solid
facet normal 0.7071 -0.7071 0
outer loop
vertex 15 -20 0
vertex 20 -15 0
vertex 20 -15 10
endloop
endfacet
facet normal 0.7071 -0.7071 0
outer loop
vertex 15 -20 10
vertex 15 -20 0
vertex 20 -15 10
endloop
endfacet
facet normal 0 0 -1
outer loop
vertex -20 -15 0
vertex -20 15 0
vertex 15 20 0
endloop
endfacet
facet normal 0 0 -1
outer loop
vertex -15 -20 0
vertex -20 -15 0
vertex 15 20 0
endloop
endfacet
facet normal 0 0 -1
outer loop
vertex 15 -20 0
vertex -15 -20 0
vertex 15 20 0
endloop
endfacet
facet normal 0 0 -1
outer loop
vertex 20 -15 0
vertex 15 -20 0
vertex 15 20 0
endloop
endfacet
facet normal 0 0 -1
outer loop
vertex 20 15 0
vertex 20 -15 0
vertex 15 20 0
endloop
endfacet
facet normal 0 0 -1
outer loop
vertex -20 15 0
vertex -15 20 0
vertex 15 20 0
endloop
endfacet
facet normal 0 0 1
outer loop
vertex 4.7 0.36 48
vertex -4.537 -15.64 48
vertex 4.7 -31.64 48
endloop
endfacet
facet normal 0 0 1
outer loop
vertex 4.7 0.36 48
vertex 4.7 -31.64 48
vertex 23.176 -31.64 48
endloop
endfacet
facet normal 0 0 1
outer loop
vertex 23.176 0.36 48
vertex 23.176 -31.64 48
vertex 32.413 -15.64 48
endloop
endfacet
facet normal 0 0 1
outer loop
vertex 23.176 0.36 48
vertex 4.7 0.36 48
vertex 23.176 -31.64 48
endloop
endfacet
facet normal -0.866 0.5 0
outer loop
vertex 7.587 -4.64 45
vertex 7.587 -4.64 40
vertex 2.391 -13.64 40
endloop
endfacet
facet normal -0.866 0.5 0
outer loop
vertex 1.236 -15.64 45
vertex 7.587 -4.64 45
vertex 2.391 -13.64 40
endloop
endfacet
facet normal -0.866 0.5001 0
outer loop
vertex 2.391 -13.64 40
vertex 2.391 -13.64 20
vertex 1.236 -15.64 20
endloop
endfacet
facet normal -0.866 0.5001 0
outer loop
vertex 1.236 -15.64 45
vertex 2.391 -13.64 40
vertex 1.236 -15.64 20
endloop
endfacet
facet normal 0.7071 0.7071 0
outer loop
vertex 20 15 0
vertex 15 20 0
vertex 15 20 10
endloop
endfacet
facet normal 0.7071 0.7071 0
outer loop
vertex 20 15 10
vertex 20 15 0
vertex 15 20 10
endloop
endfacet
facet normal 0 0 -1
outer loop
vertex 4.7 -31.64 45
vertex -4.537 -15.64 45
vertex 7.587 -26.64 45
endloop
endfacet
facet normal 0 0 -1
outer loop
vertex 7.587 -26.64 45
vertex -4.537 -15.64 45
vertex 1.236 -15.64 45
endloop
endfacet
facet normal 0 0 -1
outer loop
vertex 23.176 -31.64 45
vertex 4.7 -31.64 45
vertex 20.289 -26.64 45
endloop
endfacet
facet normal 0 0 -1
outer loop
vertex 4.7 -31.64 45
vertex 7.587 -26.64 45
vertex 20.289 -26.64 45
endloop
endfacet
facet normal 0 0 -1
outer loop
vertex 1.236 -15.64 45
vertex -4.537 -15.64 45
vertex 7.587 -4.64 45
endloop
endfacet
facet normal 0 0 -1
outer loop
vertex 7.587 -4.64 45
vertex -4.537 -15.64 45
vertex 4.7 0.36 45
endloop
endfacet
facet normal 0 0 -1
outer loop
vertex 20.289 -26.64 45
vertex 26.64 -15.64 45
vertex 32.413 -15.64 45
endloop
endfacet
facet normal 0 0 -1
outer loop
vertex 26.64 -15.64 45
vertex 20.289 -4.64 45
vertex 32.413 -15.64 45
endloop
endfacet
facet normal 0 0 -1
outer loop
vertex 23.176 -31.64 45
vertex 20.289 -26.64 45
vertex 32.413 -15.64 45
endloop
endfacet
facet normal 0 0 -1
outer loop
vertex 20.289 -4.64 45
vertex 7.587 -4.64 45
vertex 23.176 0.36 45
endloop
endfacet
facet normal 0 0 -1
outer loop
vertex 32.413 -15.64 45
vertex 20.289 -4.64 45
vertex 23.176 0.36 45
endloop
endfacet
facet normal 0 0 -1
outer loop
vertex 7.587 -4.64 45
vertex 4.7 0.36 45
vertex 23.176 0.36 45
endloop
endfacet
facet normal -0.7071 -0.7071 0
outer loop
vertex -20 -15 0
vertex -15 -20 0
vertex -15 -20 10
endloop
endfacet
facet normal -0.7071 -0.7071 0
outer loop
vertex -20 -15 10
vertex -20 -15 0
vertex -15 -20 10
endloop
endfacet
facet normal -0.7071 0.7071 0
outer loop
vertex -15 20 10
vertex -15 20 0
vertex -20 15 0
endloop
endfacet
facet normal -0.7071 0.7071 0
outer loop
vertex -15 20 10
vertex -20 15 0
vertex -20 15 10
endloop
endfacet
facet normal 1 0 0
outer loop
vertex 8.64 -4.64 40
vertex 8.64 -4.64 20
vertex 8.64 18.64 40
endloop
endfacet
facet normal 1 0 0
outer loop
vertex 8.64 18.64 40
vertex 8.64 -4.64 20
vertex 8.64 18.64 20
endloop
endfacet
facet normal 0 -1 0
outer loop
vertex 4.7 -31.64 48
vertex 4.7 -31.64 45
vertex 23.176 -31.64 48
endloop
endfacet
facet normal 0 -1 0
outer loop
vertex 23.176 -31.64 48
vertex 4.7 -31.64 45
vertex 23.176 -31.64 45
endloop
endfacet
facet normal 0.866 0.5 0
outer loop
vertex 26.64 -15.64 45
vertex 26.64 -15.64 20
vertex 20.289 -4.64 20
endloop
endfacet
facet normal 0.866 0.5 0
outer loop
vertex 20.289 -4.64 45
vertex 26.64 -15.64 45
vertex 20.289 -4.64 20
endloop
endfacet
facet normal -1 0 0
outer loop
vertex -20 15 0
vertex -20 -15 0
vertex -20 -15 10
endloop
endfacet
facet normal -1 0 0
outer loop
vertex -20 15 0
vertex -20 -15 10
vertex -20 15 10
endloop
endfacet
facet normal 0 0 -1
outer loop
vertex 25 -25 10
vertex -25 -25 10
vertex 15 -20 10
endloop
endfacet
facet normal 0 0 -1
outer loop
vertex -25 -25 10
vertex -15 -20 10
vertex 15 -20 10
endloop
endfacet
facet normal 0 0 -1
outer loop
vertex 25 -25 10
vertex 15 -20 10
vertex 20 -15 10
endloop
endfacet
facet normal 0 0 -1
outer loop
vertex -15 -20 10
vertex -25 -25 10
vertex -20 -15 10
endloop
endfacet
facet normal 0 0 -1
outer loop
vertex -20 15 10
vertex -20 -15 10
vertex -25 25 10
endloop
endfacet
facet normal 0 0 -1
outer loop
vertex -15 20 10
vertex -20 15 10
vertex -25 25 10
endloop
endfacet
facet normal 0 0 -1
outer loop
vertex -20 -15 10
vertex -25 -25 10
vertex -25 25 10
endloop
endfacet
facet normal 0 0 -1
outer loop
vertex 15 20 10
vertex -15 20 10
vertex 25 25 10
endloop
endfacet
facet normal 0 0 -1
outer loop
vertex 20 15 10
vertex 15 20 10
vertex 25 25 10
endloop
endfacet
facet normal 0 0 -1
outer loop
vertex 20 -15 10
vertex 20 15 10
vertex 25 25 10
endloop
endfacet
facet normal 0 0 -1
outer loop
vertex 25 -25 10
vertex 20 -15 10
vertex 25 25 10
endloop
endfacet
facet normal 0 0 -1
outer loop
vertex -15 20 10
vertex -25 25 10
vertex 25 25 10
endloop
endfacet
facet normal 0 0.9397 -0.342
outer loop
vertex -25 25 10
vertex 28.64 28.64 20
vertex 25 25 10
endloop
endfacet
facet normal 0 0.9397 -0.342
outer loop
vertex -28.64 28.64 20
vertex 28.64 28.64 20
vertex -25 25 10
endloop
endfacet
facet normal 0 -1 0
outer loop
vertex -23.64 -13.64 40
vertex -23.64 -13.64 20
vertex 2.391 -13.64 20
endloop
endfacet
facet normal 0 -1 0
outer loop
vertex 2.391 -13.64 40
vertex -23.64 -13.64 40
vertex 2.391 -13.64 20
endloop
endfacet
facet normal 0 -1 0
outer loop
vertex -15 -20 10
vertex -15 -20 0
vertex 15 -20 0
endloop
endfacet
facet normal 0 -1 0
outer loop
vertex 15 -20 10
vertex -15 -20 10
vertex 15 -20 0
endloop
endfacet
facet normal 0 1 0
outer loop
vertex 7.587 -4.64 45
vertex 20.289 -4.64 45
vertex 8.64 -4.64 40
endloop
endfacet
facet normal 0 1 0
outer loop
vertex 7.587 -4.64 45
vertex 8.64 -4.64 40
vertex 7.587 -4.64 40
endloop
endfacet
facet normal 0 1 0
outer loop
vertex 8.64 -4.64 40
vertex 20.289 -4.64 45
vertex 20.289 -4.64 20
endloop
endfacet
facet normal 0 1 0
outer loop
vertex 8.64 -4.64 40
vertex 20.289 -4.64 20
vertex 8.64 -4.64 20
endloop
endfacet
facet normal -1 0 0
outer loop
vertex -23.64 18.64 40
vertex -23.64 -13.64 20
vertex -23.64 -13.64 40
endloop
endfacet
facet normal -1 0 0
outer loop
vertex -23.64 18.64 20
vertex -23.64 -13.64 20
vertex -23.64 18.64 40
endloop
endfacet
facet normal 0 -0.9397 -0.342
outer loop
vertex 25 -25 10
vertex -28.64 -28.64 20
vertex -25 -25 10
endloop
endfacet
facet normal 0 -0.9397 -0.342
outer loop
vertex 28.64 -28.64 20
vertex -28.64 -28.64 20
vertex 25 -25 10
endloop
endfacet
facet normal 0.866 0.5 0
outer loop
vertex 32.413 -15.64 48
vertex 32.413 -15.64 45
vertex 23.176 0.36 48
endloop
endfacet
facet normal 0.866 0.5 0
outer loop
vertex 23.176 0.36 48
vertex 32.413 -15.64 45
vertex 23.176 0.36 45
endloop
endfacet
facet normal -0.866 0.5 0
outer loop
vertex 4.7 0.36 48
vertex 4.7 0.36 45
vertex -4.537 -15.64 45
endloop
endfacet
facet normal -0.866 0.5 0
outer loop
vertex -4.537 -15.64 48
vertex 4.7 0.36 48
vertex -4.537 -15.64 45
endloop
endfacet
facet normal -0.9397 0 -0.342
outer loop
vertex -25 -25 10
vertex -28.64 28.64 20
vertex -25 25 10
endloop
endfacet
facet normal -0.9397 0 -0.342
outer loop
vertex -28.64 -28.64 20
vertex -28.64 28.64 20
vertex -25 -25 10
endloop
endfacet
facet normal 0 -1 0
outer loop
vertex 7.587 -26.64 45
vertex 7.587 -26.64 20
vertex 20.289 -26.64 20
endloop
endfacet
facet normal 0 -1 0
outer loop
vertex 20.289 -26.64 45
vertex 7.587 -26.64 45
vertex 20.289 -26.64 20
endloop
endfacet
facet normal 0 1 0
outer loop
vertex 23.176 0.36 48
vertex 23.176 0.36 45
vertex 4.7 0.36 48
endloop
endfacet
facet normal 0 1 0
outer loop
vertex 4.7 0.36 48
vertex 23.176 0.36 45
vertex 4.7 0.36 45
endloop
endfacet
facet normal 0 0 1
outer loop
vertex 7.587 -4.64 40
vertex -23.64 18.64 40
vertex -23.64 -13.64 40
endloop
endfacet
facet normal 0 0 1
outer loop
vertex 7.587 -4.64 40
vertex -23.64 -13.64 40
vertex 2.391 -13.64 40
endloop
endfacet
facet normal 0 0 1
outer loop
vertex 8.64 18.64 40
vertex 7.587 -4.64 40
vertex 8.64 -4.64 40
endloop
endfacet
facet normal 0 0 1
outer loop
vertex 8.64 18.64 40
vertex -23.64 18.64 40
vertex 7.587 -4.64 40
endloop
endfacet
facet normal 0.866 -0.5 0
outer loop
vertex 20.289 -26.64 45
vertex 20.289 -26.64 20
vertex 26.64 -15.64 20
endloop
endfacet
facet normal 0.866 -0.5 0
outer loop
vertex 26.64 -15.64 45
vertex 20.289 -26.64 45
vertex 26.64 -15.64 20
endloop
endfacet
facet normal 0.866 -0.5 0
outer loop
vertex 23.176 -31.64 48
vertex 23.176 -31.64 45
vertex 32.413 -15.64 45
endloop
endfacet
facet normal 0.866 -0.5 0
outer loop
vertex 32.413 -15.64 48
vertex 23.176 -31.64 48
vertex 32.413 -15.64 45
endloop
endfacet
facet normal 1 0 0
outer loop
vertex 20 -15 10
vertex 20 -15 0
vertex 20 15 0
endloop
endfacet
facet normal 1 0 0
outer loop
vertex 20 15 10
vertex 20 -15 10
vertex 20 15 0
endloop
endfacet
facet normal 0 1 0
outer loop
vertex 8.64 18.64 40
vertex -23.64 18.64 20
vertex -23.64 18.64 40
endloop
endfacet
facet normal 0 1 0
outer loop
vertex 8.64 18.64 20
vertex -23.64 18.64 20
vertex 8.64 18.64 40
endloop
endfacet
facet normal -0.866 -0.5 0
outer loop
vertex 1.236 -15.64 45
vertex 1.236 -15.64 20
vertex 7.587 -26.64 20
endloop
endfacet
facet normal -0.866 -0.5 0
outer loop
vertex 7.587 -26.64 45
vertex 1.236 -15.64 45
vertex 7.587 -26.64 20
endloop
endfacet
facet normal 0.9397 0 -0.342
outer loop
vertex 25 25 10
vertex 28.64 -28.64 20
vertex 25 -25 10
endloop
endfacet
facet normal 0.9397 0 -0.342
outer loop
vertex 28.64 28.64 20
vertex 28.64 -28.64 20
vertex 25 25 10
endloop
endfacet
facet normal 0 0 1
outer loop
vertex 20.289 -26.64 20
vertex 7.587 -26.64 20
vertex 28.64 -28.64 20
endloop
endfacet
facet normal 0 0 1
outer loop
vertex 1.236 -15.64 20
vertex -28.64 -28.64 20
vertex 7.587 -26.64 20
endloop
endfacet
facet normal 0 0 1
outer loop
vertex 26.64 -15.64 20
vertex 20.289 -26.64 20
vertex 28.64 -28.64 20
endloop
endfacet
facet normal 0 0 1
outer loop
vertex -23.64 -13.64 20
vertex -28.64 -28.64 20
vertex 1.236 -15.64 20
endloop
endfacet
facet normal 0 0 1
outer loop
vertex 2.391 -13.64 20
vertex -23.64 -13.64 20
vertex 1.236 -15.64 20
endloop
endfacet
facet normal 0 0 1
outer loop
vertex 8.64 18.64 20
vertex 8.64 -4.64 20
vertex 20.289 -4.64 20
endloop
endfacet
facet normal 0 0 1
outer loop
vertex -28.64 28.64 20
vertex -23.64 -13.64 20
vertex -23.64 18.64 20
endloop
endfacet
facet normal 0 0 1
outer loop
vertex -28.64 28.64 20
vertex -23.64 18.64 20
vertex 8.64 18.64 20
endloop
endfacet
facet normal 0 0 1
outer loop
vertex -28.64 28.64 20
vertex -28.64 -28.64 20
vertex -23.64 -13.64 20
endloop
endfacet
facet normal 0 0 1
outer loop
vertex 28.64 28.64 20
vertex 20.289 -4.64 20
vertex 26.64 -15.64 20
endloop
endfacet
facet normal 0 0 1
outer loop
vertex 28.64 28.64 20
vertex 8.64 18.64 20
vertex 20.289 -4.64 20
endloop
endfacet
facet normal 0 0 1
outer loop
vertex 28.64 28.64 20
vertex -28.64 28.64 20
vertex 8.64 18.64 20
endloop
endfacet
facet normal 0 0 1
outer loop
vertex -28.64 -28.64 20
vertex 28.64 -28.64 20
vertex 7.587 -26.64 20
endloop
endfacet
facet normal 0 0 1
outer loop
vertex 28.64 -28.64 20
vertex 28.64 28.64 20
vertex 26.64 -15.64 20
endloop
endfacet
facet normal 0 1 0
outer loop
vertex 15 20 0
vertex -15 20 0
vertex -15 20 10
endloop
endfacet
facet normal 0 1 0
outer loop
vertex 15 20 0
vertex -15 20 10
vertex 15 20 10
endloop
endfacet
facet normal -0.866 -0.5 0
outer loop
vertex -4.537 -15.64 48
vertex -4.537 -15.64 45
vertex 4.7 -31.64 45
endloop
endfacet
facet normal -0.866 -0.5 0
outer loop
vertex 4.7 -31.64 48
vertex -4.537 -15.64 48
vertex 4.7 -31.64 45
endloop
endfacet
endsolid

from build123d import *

# Parameters (mm, degrees)
F0_W      = 40
F0_H      = 40
F1_DEPTH  = 10
F2_SIZE   = 5
F3_W      = 50
F3_H      = 50
F4_DEPTH  = 10
F4_TAPER  = -20
F5_W      = 32.2794046853
F5_H      = 32.2794046853
F6_DEPTH  = 20
F8_DEPTH  = 25
F10_DEPTH = 3


with BuildPart() as f1:
    # F0 (on Top) → F1 (new body)
    with BuildSketch(Plane.XY):
        Rectangle(F0_W, F0_H)
    extrude(amount=F1_DEPTH)

    # F2
    f2_edges = [f1.edges().sort_by_distance(p)[0] for p in [
        (-20, -20, 5),
        (-20, 20, 5),
        (20, -20, 5),
        (20, 20, 5),
    ]]
    chamfer(f2_edges, length=F2_SIZE)

    # F3 (on face) → F4 (join)
    with BuildSketch(Plane.XY.offset(10)):
        Rectangle(F3_W, F3_H)
    extrude(amount=F4_DEPTH, taper=F4_TAPER)

    # F5 (on face) → F6 (join)
    with BuildSketch(Plane.XY.offset(20)):
        with Locations((-7.5, 2.5)):
            Rectangle(F5_W, F5_H)
    extrude(amount=F6_DEPTH)

    # F7 (on face) → F8 (join)
    with BuildSketch(Plane.XY.offset(20)):
        Polygon((20.2888493816, -26.6397023427), (26.6397023427, -15.6397023427), (20.2888493816, -4.6397023427), (7.5871434594, -4.6397023427), (1.2362904983, -15.6397023427), (7.5871434594, -26.6397023427), align=None)
    extrude(amount=F8_DEPTH)

    # F9 (on face) → F10 (join)
    with BuildSketch(Plane.XY.offset(45)):
        Polygon((23.1756007275, -31.6397023427), (32.4132050346, -15.6397023427), (23.1756007275, 0.3602976573), (4.7003921135, 0.3602976573), (-4.5372121936, -15.6397023427), (4.7003921135, -31.6397023427), align=None)
    extrude(amount=F10_DEPTH)


solid = f1.part
